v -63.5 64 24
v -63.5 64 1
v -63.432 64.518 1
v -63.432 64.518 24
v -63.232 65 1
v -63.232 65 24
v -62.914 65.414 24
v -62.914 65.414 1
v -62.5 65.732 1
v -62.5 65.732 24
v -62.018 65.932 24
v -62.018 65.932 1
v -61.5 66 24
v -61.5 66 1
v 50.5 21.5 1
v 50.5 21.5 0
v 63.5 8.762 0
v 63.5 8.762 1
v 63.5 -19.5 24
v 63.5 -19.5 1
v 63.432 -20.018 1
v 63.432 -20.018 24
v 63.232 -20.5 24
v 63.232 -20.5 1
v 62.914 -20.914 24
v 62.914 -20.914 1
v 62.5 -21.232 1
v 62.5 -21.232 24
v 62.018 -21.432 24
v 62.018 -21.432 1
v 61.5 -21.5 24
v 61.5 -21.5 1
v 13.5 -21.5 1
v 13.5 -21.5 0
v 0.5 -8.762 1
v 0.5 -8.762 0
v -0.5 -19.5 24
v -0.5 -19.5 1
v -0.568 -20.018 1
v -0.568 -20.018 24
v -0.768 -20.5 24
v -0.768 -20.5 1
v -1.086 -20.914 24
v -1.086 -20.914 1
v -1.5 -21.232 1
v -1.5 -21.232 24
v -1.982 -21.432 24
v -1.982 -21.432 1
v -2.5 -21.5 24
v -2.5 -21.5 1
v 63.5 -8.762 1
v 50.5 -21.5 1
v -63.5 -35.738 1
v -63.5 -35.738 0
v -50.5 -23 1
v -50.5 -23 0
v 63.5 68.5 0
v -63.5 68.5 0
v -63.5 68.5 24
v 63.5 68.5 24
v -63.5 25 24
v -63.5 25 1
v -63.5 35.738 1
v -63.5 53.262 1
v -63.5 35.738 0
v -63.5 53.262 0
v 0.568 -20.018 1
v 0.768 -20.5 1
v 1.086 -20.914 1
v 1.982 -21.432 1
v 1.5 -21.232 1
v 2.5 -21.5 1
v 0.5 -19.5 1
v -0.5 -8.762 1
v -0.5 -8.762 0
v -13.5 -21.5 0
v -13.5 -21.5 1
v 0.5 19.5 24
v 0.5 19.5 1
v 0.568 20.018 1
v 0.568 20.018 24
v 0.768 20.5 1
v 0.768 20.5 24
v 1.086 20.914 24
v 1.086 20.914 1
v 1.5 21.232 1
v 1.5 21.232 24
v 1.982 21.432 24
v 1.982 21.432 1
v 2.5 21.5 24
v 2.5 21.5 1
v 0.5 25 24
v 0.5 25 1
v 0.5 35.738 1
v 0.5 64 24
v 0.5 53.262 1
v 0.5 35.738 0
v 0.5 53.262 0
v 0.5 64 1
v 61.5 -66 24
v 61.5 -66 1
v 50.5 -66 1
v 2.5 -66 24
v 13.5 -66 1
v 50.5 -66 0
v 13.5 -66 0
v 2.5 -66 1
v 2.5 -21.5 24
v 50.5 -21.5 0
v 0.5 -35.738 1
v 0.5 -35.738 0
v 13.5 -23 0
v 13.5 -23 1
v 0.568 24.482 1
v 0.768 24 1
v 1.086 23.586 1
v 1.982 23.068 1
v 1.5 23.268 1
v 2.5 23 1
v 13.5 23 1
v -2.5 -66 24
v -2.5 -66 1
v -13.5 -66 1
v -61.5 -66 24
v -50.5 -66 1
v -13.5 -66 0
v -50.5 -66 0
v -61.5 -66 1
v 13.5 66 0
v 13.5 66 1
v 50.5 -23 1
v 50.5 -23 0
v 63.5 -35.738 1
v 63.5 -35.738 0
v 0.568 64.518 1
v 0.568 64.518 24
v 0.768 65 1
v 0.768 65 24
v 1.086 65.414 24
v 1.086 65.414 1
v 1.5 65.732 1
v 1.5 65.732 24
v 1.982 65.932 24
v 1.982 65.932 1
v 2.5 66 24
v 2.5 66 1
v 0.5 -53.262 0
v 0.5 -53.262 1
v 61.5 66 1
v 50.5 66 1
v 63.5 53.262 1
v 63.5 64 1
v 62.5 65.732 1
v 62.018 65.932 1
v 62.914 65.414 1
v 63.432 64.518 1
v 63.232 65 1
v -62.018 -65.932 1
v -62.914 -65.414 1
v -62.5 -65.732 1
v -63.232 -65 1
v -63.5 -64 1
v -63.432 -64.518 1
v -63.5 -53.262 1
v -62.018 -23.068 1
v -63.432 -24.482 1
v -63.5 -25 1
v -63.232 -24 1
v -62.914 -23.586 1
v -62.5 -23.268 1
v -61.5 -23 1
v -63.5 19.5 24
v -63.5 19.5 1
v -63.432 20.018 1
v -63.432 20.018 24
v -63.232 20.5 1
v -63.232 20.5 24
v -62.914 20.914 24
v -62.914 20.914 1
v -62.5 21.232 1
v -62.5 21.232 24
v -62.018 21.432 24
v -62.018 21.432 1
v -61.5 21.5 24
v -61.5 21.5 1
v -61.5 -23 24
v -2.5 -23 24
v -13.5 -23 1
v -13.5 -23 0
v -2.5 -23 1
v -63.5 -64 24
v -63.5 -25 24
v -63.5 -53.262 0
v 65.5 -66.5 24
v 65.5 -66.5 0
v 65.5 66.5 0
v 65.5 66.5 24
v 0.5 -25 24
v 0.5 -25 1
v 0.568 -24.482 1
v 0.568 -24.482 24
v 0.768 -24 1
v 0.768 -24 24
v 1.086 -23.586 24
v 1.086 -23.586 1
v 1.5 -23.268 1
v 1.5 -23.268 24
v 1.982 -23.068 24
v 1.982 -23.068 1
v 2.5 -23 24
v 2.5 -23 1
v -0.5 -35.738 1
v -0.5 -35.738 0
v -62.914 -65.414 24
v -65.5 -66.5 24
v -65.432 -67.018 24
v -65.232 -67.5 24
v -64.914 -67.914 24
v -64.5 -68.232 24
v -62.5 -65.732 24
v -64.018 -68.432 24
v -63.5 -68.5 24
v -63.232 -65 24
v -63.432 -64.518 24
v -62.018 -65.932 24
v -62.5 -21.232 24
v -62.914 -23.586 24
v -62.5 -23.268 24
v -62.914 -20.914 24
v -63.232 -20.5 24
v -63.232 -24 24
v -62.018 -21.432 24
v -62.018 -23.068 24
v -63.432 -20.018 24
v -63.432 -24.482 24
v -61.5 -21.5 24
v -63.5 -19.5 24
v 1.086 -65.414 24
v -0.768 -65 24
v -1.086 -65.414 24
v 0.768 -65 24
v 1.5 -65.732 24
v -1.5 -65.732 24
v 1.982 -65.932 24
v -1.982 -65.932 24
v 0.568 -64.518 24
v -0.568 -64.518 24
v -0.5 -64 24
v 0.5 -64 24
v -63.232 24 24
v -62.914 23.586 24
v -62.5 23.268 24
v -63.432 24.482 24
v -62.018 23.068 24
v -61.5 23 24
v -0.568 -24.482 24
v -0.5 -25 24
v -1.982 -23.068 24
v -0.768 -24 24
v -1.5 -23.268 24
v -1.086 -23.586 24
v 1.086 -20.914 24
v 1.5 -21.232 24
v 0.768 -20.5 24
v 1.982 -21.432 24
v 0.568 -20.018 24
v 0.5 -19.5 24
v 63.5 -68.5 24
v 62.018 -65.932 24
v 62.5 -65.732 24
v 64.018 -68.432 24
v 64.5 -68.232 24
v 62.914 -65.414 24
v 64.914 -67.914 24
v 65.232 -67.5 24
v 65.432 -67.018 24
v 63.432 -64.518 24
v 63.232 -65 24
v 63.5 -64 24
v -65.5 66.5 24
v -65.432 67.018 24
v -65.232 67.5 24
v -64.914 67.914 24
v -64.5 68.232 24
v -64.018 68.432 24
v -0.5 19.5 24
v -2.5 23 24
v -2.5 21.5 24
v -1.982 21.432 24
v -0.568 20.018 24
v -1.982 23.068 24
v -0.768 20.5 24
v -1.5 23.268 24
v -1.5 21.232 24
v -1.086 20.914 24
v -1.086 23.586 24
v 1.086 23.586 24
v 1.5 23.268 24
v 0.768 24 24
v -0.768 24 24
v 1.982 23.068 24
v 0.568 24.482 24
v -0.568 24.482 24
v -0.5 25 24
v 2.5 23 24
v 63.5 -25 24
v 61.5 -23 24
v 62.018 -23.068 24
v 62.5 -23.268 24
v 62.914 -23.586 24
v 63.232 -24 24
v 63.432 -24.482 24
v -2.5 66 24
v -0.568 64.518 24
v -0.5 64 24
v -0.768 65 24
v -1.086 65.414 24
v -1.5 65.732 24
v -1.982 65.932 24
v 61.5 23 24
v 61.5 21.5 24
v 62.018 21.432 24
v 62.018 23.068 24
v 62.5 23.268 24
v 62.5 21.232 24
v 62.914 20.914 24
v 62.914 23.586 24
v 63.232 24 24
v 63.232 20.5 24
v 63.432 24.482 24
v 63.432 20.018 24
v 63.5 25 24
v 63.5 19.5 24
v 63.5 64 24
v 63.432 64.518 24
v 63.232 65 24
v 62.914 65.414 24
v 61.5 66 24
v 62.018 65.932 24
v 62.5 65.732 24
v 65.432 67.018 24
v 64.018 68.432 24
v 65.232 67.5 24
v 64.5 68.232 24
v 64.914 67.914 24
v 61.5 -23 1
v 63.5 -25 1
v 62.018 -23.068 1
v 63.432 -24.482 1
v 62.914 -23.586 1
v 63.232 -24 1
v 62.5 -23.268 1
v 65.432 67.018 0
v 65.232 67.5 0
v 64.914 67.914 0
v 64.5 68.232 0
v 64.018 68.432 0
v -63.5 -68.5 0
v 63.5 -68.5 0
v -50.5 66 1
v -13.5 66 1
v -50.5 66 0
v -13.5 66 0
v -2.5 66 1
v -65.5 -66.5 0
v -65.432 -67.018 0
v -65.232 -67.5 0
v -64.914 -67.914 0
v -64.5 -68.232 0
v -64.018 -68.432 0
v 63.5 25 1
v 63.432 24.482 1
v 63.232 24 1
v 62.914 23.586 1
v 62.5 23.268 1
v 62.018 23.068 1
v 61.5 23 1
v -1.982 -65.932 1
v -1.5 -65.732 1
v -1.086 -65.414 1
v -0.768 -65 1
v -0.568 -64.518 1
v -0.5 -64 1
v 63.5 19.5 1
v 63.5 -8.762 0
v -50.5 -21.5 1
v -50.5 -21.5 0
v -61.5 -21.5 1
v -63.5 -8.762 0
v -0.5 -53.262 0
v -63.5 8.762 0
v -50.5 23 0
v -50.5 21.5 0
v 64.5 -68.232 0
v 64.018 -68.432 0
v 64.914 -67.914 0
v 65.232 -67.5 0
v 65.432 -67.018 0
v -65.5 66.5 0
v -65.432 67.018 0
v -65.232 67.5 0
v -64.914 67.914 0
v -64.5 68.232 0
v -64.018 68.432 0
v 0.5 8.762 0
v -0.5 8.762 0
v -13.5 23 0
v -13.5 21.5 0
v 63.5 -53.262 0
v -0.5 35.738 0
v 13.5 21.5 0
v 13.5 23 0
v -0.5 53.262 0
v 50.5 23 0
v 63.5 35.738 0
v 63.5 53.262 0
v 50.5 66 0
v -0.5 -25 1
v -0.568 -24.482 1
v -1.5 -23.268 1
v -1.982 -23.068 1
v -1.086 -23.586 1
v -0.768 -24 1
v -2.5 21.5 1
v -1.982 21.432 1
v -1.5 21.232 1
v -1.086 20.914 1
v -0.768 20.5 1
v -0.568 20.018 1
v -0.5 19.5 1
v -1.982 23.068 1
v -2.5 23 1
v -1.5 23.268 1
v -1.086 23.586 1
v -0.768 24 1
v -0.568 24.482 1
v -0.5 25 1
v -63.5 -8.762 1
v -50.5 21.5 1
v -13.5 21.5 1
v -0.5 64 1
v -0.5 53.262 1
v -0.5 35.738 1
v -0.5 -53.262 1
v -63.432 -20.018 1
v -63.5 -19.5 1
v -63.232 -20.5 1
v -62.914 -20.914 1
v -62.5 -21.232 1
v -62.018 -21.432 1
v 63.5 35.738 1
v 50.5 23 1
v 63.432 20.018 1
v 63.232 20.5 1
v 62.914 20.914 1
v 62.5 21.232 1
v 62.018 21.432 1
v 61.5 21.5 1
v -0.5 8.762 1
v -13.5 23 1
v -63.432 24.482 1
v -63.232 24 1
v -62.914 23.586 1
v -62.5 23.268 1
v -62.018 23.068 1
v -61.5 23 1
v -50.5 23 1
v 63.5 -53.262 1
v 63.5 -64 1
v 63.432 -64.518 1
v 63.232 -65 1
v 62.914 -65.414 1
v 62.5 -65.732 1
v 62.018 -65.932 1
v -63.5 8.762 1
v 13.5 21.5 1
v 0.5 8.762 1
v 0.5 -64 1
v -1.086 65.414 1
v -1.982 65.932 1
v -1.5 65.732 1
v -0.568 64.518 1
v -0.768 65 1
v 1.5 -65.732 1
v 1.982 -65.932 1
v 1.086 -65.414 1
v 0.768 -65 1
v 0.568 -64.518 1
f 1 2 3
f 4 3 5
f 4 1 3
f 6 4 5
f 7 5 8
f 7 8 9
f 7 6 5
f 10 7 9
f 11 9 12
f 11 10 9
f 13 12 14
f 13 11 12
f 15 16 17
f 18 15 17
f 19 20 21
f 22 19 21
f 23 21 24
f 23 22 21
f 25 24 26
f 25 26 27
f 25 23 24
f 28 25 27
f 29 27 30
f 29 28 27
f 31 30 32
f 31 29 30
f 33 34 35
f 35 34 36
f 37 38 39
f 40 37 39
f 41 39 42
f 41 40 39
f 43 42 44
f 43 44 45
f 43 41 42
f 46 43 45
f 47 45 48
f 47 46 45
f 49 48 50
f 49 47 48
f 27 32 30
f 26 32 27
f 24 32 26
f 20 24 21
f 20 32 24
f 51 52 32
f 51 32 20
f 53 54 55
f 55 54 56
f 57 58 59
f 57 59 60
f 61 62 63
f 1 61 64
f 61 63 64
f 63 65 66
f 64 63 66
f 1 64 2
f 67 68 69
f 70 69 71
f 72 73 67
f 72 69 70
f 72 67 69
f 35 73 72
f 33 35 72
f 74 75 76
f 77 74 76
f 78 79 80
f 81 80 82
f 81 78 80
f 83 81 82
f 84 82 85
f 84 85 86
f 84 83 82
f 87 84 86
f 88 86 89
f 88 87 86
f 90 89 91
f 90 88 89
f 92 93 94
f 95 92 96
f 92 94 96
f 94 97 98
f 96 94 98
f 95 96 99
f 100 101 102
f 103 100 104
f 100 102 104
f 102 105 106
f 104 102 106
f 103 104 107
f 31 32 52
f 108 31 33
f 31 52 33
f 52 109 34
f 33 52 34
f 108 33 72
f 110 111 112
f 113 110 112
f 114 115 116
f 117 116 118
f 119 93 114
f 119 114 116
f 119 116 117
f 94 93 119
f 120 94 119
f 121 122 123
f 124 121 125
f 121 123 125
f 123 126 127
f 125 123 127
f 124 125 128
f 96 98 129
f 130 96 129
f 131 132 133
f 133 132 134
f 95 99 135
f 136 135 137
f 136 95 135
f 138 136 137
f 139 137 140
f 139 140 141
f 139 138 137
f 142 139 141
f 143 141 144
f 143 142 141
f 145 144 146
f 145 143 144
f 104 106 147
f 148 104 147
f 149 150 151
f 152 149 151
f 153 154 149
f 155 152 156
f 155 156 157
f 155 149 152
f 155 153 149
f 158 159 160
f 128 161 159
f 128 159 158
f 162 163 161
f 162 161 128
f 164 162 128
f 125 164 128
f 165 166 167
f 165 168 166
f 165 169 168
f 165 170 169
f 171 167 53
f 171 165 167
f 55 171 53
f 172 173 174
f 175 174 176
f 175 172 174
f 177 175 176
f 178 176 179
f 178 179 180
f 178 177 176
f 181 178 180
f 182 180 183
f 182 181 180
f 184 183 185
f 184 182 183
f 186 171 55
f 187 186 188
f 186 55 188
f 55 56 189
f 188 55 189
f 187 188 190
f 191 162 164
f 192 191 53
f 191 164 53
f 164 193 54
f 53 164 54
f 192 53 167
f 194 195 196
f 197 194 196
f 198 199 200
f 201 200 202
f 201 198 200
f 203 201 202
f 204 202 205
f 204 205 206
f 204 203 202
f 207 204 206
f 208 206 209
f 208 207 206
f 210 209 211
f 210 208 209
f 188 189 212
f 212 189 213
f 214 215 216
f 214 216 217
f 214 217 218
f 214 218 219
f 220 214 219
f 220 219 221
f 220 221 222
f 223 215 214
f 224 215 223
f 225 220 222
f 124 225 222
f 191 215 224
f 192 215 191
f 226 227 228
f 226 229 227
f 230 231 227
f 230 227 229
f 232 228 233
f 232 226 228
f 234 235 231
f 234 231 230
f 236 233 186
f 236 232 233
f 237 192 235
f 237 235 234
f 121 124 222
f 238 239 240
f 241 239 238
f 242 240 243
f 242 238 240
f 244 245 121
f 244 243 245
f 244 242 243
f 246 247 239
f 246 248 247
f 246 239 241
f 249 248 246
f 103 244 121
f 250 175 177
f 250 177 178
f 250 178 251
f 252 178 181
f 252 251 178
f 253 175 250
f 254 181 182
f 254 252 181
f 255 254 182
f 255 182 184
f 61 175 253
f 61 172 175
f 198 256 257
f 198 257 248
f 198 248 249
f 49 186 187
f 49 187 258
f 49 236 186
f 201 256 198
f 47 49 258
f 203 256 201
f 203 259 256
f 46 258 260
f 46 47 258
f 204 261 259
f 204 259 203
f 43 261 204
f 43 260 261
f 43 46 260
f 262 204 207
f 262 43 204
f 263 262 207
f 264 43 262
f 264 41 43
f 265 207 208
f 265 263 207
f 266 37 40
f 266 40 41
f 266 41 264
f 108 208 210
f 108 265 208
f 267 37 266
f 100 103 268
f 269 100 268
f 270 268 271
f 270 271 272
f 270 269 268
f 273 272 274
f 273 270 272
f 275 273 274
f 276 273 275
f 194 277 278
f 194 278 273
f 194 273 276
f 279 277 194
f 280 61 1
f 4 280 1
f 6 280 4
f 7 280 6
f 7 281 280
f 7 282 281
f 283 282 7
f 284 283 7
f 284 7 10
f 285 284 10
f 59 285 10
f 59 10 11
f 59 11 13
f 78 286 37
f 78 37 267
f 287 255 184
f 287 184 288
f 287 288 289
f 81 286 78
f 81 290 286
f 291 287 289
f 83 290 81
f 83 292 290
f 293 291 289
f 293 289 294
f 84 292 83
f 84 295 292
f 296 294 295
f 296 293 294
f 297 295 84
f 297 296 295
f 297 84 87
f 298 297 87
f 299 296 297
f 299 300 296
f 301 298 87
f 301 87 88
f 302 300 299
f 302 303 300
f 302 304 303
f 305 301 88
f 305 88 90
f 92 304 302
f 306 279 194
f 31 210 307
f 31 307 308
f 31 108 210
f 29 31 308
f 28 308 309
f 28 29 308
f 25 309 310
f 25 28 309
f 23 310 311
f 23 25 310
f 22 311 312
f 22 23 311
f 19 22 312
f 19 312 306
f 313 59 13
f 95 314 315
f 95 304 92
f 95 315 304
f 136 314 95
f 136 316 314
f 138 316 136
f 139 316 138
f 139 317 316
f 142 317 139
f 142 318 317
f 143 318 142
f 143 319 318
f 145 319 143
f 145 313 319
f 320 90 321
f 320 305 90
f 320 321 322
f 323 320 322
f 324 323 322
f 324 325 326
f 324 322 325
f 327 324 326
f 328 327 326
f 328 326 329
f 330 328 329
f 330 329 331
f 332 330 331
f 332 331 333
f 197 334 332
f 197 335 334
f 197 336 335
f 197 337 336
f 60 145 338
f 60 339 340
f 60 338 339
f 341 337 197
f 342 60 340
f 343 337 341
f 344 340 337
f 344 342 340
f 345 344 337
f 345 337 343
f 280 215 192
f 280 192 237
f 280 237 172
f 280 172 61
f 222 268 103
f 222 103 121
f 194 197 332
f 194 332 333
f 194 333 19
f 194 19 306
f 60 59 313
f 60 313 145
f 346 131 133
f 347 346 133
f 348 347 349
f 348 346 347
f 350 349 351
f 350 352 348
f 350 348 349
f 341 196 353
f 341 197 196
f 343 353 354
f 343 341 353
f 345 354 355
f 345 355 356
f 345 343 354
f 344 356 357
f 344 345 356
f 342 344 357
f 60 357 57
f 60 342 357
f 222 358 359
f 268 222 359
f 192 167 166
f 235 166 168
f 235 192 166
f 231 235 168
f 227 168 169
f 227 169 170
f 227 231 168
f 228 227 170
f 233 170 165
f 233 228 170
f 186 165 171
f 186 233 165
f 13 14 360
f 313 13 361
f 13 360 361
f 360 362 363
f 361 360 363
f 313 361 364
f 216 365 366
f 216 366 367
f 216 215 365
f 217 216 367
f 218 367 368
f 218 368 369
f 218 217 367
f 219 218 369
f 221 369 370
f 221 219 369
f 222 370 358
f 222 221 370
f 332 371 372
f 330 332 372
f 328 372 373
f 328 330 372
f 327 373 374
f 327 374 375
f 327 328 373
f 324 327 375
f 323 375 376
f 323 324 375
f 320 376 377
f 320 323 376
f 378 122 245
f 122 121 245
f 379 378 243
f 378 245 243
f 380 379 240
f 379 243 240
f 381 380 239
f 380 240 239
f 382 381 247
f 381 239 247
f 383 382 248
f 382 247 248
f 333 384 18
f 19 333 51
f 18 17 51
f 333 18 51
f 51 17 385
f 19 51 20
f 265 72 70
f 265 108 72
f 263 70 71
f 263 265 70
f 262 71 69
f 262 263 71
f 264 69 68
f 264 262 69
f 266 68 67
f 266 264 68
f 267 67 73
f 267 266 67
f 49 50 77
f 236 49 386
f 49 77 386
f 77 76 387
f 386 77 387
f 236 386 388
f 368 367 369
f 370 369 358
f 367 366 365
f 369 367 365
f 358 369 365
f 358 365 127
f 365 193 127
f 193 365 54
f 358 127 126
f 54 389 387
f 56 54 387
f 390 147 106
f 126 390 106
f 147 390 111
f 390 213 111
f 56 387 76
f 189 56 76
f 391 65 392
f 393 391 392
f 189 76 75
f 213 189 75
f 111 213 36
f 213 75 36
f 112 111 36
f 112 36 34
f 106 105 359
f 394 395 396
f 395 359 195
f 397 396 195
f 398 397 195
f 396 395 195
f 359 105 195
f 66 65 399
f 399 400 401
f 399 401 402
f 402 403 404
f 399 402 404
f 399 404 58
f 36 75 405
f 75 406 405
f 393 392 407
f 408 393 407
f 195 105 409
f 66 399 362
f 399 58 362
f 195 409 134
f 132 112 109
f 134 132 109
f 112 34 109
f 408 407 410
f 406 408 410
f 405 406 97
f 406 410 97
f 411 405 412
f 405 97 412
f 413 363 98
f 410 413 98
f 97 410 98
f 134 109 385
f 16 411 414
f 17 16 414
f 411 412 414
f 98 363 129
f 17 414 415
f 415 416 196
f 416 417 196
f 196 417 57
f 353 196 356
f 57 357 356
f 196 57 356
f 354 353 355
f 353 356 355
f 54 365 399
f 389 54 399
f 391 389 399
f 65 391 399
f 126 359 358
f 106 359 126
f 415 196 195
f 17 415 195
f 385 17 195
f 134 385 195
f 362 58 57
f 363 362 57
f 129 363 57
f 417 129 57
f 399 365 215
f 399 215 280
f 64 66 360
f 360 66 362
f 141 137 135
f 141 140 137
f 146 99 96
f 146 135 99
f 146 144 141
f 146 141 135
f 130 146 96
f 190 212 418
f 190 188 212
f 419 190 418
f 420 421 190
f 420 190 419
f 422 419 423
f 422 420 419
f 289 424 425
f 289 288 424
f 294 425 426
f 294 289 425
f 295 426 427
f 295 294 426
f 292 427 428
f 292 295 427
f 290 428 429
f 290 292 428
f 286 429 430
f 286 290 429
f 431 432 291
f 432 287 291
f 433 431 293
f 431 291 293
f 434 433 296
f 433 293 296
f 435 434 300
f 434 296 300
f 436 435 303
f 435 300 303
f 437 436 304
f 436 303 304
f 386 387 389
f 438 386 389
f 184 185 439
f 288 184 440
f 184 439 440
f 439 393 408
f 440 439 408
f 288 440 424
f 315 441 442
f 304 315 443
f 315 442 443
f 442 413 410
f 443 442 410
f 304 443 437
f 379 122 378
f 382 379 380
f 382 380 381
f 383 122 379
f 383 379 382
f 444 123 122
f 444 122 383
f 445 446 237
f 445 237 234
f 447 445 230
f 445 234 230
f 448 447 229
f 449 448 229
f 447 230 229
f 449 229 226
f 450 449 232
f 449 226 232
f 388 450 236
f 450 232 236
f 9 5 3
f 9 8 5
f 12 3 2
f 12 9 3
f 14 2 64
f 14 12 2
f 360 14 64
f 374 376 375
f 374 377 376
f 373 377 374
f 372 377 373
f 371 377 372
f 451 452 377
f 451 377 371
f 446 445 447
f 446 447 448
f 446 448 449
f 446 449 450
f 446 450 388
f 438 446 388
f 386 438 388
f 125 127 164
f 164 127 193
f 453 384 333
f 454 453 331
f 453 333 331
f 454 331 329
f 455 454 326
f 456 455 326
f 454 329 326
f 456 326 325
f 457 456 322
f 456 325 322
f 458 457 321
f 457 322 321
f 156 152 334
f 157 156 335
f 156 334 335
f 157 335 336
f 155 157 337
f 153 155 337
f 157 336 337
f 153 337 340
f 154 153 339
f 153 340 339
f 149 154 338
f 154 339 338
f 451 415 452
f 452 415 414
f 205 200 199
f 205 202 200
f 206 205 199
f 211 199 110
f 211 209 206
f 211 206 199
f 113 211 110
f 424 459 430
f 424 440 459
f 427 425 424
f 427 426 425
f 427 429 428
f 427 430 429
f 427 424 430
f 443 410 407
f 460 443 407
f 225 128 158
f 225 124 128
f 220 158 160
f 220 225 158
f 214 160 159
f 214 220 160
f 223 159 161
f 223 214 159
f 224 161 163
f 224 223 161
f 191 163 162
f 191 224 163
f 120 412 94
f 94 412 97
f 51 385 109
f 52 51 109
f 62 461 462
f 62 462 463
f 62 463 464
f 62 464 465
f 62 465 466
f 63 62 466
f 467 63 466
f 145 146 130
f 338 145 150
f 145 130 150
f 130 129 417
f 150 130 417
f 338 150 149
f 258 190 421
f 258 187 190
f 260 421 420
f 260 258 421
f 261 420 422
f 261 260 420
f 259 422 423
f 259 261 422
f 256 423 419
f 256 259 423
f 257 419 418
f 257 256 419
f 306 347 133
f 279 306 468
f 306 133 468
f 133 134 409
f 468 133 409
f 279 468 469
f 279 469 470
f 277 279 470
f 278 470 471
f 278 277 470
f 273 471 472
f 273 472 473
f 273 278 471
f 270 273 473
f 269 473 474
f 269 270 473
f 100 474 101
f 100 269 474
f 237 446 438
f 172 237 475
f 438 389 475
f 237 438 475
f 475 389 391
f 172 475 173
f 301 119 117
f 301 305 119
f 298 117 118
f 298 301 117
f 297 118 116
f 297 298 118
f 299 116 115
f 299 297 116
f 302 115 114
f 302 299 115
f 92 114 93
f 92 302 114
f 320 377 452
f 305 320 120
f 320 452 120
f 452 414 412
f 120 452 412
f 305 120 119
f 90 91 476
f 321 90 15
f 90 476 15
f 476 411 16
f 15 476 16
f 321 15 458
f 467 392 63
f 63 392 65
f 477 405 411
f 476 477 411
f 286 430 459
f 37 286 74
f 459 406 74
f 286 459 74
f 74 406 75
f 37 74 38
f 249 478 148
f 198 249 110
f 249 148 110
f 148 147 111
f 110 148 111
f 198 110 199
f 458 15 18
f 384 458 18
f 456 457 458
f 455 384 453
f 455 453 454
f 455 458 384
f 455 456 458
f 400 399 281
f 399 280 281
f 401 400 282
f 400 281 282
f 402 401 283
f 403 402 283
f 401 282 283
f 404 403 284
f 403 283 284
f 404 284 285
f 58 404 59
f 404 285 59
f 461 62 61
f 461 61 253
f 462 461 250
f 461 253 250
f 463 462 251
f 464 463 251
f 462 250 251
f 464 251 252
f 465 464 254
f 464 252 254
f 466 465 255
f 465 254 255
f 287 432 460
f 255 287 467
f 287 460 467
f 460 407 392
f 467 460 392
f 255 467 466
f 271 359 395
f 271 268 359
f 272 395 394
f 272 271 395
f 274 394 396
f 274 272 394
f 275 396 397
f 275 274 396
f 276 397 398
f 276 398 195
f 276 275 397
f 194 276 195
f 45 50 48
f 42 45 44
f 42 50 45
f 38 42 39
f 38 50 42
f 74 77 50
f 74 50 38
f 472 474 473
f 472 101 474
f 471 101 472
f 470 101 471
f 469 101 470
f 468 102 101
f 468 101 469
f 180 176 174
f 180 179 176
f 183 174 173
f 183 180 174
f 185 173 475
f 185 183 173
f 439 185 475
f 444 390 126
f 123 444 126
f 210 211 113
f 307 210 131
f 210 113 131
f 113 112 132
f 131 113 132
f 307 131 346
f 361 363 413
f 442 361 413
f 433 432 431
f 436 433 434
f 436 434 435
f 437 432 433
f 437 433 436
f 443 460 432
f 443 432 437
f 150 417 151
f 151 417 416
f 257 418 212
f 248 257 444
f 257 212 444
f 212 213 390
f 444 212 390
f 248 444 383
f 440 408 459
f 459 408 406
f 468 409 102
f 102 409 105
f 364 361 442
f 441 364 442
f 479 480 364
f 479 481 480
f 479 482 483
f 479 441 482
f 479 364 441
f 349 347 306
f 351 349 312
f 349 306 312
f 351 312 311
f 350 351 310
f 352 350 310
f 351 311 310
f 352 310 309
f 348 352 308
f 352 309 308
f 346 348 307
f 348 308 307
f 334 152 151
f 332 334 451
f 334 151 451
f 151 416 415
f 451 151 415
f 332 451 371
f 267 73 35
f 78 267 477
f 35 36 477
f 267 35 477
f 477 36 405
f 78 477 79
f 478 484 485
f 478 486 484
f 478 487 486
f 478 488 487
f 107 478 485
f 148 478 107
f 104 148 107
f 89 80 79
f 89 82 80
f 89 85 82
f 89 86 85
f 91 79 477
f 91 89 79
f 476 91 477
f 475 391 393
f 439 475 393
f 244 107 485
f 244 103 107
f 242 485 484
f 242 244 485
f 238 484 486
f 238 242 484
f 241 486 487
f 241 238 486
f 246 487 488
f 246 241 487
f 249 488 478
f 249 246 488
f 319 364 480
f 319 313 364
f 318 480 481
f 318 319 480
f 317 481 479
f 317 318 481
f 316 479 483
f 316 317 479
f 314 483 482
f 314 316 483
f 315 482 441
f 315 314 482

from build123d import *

# Parameters (mm, degrees)
F0_W     = 131
F0_H     = 137
F1_DEPTH = 24
F2_DEPTH = 1
F3_R     = 2


with BuildPart() as f1:
    # F0 (on Top) → F1 (new body)
    with BuildSketch(Plane.XY):
        Rectangle(F0_W, F0_H)
        Polygon((63.5, -53.262113756), (63.5, -66), (50.5, -66), (13.5, -66), (0.5, -66), (-0.5, -66), (-13.5, -66), (-50.5, -66), (-63.5, -66), (-63.5, -53.262113756), (-63.5, -35.737886244), (-63.5, -23), (-63.5, -21.5), (-63.5, -8.762113756), (-63.5, 8.762113756), (-63.5, 21.5), (-63.5, 23), (-63.5, 35.737886244), (-63.5, 53.262113756), (-63.5, 66), (-50.5, 66), (-13.5, 66), (-0.5, 66), (0.5, 66), (13.5, 66), (50.5, 66), (63.5, 66), (63.5, 53.262113756), (63.5, 35.737886244), (63.5, 23), (63.5, 21.5), (63.5, 8.762113756), (63.5, -8.762113756), (63.5, -21.5), (63.5, -23), (63.5, -35.737886244), align=None, mode=Mode.SUBTRACT)
        Polygon((-0.5, -66), (0.5, -66), (0.5, -53.262113756), (0.5, -35.737886244), (0.5, -23), (0.5, -21.5), (0.5, -8.762113756), (0.5, 8.762113756), (0.5, 21.5), (0.5, 23), (0.5, 35.737886244), (0.5, 53.262113756), (0.5, 66), (-0.5, 66), (-0.5, 53.262113756), (-0.5, 35.737886244), (-0.5, 23), (-0.5, 21.5), (-0.5, 8.762113756), (-0.5, -8.762113756), (-0.5, -21.5), (-0.5, -23), (-0.5, -35.737886244), (-0.5, -53.262113756), align=None)
        Polygon((50.5, 21.5), (63.5, 21.5), (63.5, 23), (50.5, 23), (13.5, 23), (0.5, 23), (0.5, 21.5), (13.5, 21.5), align=None)
        Polygon((-13.5, 21.5), (-0.5, 21.5), (-0.5, 23), (-13.5, 23), (-50.5, 23), (-63.5, 23), (-63.5, 21.5), (-50.5, 21.5), align=None)
        Polygon((-13.5, -23), (-0.5, -23), (-0.5, -21.5), (-13.5, -21.5), (-50.5, -21.5), (-63.5, -21.5), (-63.5, -23), (-50.5, -23), align=None)
        Polygon((50.5, -23), (63.5, -23), (63.5, -21.5), (50.5, -21.5), (13.5, -21.5), (0.5, -21.5), (0.5, -23), (13.5, -23), align=None)
    extrude(amount=F1_DEPTH)

    # F0 (on Top) → F2 (join)
    with BuildSketch(Plane.XY):
        Polygon((-63.5, 66), (-63.5, 53.262113756), (-50.5, 66), align=None)
        Polygon((-63.5, 35.737886244), (-63.5, 23), (-50.5, 23), align=None)
        Polygon((-13.5, 66), (-0.5, 53.262113756), (-0.5, 66), align=None)
        Polygon((-13.5, 23), (-0.5, 23), (-0.5, 35.737886244), align=None)
        Polygon((0.5, 66), (0.5, 53.262113756), (13.5, 66), align=None)
        Polygon((50.5, 66), (63.5, 53.262113756), (63.5, 66), align=None)
        Polygon((50.5, 23), (63.5, 23), (63.5, 35.737886244), align=None)
        Polygon((0.5, 35.737886244), (0.5, 23), (13.5, 23), align=None)
        Polygon((0.5, 21.5), (0.5, 8.762113756), (13.5, 21.5), align=None)
        Polygon((-13.5, 21.5), (-0.5, 8.762113756), (-0.5, 21.5), align=None)
        Polygon((-63.5, 21.5), (-63.5, 8.762113756), (-50.5, 21.5), align=None)
        Polygon((-63.5, -8.762113756), (-63.5, -21.5), (-50.5, -21.5), align=None)
        Polygon((-13.5, -21.5), (-0.5, -21.5), (-0.5, -8.762113756), align=None)
        Polygon((50.5, -21.5), (63.5, -21.5), (63.5, -8.762113756), align=None)
        Polygon((50.5, 21.5), (63.5, 8.762113756), (63.5, 21.5), align=None)
        Polygon((0.5, -8.762113756), (0.5, -21.5), (13.5, -21.5), align=None)
        Polygon((0.5, -23), (0.5, -35.737886244), (13.5, -23), align=None)
        Polygon((-13.5, -23), (-0.5, -35.737886244), (-0.5, -23), align=None)
        Polygon((-63.5, -23), (-63.5, -35.737886244), (-50.5, -23), align=None)
        Polygon((-63.5, -66), (-50.5, -66), (-63.5, -53.262113756), align=None)
        Polygon((-13.5, -66), (-0.5, -66), (-0.5, -53.262113756), align=None)
        Polygon((0.5, -66), (13.5, -66), (0.5, -53.262113756), align=None)
        Polygon((50.5, -23), (63.5, -35.737886244), (63.5, -23), align=None)
        Polygon((50.5, -66), (63.5, -66), (63.5, -53.262113756), align=None)
    extrude(amount=F2_DEPTH)

    # F3
    f3_edges = [f1.edges().sort_by_distance(p)[0] for p in [
        (-65.5, 68.5, 12),
        (65.5, 68.5, 12),
        (-65.5, -68.5, 12),
        (65.5, -68.5, 12),
        (63.5, -23, 12.5),
        (63.5, 66, 12.5),
        (-0.5, 66, 12.5),
        (-0.5, 21.5, 12.5),
        (-0.5, -23, 12.5),
        (63.5, 21.5, 12.5),
        (-63.5, 21.5, 12.5),
        (-63.5, 66, 12.5),
        (-63.5, -23, 12.5),
        (0.5, 66, 12.5),
        (0.5, 21.5, 12.5),
        (0.5, -23, 12.5),
        (-63.5, -66, 12.5),
        (-63.5, -21.5, 12.5),
        (-63.5, 23, 12.5),
        (0.5, 23, 12.5),
        (0.5, -21.5, 12.5),
        (0.5, -66, 12.5),
        (-0.5, -66, 12.5),
        (-0.5, -21.5, 12.5),
        (-0.5, 23, 12.5),
        (63.5, 23, 12.5),
        (63.5, -21.5, 12.5),
        (63.5, -66, 12.5),
    ]]
    fillet(f3_edges, radius=F3_R)


solid = f1.part
